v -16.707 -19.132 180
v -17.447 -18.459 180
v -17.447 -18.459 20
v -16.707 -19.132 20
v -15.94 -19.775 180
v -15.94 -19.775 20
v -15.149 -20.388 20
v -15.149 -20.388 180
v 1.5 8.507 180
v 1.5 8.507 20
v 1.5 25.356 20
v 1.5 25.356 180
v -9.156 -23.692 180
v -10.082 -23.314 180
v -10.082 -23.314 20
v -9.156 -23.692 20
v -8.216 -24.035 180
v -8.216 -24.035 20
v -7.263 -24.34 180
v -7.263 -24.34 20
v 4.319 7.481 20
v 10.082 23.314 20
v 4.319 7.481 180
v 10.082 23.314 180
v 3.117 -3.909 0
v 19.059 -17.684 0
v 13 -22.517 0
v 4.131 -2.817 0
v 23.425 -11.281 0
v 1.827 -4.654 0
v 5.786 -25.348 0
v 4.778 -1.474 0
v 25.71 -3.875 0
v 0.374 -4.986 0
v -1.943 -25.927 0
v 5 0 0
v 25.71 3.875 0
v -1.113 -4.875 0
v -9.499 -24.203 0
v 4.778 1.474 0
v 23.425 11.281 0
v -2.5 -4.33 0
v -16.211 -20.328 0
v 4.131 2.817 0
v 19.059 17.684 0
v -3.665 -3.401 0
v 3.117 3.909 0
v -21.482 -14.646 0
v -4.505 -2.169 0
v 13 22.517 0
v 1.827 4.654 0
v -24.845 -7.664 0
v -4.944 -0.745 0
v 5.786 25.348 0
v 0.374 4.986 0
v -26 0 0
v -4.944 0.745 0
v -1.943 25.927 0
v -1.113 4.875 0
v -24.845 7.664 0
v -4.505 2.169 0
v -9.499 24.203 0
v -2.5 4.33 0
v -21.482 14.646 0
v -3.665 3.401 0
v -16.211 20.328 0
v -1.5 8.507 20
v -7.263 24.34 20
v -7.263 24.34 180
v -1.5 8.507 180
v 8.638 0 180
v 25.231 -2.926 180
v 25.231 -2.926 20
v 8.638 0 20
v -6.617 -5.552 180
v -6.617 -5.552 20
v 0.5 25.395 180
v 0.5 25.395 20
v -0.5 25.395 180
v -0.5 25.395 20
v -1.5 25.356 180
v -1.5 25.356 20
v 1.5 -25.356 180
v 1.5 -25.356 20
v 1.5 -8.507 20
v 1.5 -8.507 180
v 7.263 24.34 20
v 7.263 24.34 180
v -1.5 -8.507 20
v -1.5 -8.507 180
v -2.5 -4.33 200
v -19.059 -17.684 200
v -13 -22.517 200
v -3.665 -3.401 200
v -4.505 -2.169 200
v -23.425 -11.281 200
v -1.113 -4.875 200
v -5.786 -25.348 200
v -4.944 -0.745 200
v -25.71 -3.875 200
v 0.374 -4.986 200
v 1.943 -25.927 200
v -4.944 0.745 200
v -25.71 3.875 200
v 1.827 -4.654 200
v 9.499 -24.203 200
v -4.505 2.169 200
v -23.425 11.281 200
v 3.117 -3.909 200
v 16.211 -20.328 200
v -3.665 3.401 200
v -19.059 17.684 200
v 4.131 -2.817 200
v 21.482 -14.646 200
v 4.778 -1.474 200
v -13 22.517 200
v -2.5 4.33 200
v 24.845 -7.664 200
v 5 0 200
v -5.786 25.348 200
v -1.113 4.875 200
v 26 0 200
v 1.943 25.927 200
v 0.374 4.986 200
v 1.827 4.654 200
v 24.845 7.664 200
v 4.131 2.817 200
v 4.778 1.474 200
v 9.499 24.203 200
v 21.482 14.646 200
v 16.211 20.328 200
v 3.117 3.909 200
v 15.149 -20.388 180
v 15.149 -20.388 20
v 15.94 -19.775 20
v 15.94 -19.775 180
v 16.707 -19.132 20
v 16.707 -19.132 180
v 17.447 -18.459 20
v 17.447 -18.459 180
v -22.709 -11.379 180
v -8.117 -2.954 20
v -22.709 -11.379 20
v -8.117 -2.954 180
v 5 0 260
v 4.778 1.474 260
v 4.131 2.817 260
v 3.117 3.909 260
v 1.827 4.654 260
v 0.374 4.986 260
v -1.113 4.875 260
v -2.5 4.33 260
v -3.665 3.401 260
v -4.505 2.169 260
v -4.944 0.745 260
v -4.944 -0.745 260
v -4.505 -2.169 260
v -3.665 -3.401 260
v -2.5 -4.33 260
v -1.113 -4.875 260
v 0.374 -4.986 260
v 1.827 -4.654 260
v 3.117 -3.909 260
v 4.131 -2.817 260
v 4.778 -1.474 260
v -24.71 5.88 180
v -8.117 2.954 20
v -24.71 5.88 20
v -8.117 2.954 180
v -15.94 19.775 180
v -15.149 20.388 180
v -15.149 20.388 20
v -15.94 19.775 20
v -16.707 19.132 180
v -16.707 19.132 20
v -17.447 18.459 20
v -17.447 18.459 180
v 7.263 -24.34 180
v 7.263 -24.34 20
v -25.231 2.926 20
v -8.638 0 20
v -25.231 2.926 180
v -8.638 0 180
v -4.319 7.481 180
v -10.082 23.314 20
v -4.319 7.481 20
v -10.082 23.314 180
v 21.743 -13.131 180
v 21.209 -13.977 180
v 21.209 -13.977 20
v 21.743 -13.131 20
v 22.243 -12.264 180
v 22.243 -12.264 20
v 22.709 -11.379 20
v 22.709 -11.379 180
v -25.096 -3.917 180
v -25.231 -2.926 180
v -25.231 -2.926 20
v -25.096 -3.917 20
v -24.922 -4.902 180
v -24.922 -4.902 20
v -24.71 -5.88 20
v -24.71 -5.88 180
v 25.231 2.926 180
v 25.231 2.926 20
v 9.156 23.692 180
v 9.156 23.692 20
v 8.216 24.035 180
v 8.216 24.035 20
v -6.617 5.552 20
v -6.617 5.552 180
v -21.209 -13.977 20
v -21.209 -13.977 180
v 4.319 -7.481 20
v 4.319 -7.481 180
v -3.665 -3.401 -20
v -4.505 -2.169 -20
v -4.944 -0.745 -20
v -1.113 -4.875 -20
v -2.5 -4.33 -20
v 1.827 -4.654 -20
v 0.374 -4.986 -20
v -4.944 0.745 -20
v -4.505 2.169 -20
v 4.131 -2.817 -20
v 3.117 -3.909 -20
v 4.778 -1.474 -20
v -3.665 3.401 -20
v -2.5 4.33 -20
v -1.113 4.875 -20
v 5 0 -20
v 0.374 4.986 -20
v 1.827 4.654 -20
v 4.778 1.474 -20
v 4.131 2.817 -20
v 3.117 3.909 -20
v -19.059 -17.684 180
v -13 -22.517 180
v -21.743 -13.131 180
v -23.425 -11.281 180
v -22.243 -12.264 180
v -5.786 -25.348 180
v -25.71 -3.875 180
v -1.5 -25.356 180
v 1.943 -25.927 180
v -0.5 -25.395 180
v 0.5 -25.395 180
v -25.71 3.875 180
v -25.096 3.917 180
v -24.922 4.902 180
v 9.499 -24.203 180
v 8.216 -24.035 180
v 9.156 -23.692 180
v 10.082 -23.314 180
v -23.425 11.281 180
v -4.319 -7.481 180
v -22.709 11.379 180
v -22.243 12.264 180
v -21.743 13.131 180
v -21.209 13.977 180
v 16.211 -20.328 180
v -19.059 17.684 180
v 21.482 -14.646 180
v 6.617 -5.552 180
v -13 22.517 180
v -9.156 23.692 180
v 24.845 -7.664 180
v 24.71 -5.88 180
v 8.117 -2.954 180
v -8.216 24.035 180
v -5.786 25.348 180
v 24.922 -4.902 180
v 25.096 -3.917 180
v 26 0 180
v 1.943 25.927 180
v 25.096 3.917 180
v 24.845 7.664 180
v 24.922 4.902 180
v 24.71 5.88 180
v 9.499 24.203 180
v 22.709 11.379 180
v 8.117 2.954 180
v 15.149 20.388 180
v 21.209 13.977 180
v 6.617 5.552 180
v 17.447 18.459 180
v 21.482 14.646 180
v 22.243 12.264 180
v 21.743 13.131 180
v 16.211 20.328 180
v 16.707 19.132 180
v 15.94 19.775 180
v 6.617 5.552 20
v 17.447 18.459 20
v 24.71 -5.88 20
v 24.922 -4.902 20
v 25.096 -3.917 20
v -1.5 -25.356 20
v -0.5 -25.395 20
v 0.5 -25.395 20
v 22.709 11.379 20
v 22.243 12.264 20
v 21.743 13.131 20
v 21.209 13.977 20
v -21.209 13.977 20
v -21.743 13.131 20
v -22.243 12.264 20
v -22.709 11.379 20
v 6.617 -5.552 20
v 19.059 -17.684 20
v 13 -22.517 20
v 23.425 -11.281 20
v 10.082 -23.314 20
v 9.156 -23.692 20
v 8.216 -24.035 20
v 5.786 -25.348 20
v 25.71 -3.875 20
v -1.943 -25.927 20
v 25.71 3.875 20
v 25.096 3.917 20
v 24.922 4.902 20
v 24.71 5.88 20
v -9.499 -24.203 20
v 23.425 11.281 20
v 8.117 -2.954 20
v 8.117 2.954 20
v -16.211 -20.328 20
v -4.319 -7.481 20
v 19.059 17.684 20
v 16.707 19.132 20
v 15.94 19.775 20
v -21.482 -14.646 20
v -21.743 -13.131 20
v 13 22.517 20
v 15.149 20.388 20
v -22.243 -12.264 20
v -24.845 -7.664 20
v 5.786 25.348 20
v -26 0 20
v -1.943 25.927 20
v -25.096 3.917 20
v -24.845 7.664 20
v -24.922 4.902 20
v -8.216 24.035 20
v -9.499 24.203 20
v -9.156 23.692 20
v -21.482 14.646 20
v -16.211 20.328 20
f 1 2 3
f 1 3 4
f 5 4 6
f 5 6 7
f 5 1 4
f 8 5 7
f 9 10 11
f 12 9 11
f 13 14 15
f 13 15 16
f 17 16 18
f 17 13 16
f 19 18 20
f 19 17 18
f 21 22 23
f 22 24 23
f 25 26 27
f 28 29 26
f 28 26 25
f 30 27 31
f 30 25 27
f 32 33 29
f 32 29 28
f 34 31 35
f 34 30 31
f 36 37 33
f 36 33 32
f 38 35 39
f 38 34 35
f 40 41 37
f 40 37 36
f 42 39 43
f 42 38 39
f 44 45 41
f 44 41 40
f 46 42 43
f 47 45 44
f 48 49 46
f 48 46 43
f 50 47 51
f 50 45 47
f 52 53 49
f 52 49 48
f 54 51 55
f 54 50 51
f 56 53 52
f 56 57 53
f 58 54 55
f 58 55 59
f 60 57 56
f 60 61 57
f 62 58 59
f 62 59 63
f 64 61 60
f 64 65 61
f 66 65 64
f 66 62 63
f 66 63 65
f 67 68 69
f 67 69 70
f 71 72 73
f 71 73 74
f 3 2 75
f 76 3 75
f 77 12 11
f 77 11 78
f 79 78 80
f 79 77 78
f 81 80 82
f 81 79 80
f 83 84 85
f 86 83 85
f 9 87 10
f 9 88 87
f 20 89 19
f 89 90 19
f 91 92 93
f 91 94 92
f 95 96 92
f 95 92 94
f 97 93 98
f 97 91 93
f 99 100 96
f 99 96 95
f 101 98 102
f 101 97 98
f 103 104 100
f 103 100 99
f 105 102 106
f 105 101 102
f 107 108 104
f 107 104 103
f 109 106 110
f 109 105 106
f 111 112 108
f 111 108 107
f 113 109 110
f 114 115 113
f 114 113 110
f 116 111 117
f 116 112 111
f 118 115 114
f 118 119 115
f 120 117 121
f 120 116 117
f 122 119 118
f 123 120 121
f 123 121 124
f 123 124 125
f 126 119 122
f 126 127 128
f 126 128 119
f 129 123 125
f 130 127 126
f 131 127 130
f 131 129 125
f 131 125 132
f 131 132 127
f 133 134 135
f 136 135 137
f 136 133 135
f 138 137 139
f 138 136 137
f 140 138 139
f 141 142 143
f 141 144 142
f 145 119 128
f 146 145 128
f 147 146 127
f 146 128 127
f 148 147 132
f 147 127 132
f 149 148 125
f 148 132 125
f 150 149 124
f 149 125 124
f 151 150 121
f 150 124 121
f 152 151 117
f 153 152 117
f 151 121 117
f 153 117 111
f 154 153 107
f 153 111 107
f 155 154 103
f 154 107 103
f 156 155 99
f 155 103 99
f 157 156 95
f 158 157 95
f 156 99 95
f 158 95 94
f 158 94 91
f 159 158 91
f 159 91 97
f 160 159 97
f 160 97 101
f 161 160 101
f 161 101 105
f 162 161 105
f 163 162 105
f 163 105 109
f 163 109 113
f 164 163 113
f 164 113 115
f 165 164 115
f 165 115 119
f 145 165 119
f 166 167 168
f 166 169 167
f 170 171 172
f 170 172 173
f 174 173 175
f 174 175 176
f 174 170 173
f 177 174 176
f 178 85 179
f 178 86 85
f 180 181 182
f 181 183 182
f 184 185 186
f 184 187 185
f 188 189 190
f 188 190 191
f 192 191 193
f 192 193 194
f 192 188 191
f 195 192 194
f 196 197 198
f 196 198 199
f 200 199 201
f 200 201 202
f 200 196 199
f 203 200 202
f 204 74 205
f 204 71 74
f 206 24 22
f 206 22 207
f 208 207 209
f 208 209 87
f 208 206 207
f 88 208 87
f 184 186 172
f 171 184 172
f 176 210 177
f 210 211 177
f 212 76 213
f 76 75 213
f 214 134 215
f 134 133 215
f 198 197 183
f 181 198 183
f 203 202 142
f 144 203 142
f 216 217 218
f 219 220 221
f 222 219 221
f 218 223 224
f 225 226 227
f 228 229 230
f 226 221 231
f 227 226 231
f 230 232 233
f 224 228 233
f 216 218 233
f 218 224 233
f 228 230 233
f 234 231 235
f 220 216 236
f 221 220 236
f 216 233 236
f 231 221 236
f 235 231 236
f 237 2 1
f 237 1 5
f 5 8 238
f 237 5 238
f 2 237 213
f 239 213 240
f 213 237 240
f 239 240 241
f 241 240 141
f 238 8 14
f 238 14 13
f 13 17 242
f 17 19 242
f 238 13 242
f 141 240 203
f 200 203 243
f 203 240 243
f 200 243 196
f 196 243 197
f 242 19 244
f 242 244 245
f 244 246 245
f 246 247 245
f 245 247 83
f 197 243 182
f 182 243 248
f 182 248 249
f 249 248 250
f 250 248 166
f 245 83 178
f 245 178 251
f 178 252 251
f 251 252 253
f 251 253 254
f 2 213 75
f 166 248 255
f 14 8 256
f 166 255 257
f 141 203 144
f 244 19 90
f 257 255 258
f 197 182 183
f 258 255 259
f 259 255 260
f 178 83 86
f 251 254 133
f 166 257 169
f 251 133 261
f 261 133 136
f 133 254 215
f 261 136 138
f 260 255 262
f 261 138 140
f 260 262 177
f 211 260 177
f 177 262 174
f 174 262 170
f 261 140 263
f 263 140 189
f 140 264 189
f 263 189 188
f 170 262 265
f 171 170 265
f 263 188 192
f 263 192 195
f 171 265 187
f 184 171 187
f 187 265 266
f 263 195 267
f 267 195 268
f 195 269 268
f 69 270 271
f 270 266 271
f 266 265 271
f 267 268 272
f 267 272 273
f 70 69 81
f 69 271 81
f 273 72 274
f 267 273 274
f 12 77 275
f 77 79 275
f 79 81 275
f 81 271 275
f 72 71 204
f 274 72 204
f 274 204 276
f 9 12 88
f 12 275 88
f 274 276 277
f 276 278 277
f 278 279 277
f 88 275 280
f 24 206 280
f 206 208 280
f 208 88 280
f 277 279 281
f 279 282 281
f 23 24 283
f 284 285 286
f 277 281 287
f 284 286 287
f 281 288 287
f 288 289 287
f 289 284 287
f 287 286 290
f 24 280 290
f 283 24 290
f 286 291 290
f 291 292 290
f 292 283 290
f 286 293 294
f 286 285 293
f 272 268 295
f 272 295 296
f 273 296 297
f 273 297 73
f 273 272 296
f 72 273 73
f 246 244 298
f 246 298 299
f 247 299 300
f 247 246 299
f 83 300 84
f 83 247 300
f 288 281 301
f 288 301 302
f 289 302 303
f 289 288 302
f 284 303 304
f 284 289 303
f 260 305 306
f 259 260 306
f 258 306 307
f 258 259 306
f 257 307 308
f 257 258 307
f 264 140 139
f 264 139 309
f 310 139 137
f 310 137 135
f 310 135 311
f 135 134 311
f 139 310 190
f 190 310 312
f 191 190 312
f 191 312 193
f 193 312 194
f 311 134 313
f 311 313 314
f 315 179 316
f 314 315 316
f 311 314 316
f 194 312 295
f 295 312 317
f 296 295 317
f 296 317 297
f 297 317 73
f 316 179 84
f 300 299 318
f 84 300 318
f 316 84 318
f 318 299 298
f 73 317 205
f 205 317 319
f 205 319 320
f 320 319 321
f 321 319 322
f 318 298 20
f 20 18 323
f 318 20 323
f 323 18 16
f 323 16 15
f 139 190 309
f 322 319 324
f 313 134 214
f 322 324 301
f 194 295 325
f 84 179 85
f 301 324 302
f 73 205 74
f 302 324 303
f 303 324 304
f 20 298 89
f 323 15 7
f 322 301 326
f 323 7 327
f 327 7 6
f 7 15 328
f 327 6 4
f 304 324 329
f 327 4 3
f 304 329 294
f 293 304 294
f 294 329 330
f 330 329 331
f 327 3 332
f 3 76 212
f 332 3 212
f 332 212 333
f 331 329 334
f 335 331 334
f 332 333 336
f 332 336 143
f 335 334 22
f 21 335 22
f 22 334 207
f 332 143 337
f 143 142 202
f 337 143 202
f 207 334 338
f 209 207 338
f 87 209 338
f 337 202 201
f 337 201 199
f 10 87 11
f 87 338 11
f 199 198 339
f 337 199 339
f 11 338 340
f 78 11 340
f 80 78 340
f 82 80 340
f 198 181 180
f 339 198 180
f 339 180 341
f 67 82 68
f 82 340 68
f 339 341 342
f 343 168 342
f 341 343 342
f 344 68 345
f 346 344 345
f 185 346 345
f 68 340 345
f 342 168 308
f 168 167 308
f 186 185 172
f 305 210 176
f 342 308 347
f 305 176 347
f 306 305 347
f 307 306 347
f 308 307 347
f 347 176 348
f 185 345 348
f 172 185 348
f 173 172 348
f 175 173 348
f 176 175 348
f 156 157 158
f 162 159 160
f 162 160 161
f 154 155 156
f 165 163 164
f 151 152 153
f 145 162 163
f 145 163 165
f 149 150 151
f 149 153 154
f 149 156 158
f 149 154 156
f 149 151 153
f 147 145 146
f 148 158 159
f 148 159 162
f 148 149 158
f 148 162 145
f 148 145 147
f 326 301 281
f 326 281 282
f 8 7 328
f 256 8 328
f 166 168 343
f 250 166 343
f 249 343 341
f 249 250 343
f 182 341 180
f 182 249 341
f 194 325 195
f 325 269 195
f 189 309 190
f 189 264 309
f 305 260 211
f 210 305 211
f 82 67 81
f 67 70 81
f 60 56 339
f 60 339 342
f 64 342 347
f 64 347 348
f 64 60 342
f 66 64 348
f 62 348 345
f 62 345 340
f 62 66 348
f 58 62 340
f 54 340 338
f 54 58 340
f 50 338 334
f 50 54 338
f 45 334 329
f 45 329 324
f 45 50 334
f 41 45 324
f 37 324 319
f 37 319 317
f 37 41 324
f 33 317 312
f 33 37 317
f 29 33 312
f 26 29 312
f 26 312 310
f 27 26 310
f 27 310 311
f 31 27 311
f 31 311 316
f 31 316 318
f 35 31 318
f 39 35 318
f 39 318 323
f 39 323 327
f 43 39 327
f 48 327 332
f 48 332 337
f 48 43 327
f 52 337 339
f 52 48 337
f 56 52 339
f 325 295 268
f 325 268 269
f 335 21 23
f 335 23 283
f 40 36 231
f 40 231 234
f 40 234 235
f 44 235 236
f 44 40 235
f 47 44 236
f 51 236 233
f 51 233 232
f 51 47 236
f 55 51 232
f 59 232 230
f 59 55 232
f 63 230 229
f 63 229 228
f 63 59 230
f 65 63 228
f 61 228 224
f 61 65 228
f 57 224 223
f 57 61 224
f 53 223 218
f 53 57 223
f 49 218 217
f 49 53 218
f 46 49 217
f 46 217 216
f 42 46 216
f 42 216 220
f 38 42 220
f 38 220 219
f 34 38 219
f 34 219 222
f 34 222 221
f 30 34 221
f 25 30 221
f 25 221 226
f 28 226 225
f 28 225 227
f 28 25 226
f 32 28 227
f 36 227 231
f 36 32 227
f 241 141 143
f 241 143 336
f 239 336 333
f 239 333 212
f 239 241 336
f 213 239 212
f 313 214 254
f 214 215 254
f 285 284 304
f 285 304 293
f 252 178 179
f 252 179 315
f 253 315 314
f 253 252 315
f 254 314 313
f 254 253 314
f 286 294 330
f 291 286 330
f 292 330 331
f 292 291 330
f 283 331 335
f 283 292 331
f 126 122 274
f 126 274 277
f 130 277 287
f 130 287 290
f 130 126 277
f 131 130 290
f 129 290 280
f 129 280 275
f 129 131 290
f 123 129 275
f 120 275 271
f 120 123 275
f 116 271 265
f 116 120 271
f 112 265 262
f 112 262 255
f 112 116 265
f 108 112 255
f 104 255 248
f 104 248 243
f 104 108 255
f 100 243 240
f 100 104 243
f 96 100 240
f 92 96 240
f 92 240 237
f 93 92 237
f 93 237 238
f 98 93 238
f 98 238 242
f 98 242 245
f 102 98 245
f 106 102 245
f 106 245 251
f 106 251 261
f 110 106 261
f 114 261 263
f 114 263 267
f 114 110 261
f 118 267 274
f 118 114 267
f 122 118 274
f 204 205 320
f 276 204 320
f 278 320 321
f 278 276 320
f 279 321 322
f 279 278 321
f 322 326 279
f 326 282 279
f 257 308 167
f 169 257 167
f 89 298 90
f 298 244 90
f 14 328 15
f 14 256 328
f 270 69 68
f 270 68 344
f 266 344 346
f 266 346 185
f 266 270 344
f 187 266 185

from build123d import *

# Parameters (mm, degrees)
SKETCH1_R                = 6.35
BOSS_EXTRUDE1_DEPTH      = 300
SKETCH2_W                = 3
SKETCH2_H                = 101.6
BOSS_EXTRUDE2_DEPTH      = 300
CIRPATTERN1_COUNT        = 9
SKETCH9_R                = 60.024928634
SKETCH9_R_2              = 25.4
CUT_EXTRUDE1_DEPTH       = 317.2
SKETCH11_W               = 209.953471272
SKETCH11_H               = 400
CUT_EXTRUDE2_DEPTH       = 158.6
SKETCH13_R               = 5
BOSS_EXTRUDE3_DEPTH      = 260
BOSS_EXTRUDE3_DEPTH_BACK = 20
SKETCH14_R               = 26
BOSS_EXTRUDE4_DEPTH      = 20
SKETCH15_R               = 26
BOSS_EXTRUDE5_DEPTH      = 20


with BuildPart() as part:
    # Sketch1 → Boss-Extrude1 (new body)
    with BuildSketch(Plane.XY):
        Circle(SKETCH1_R)
    extrude(amount=BOSS_EXTRUDE1_DEPTH)

    # Sketch2 → Boss-Extrude2 (add, through all)
    with BuildSketch(Plane.XY.offset(300)):
        Rectangle(SKETCH2_W, SKETCH2_H)
    boss_extrude2 = extrude(amount=-BOSS_EXTRUDE2_DEPTH)

    # CirPattern1: Boss-Extrude2 ×9 about axis
    cirpattern1_axis = Axis((0, 0, 0), (0, 0, 1))
    for i in range(1, CIRPATTERN1_COUNT):
        add(boss_extrude2.rotate(cirpattern1_axis, i * 360 / CIRPATTERN1_COUNT))

    # Sketch9 → Cut-Extrude1 (cut)
    with BuildSketch(Plane.XY.offset(300)):
        Circle(SKETCH9_R)
        Circle(SKETCH9_R_2, mode=Mode.SUBTRACT)
    extrude(amount=-CUT_EXTRUDE1_DEPTH, mode=Mode.SUBTRACT)

    # Sketch11 → Cut-Extrude2 (cut, symmetric)
    with BuildSketch(Plane(origin=(0, 0, 0), x_dir=(1, 0, 0), z_dir=(0, 1, 0))):
        with Locations((-1.595391119, -400)):
            Rectangle(SKETCH11_W, SKETCH11_H)
    extrude(amount=CUT_EXTRUDE2_DEPTH, both=True, mode=Mode.SUBTRACT)

    # Sketch13 → Boss-Extrude3 (add, two sides)
    with BuildSketch(Plane.XY) as boss_extrude3_sk:
        Circle(SKETCH13_R)
    extrude(amount=BOSS_EXTRUDE3_DEPTH)
    extrude(boss_extrude3_sk.sketch, amount=-BOSS_EXTRUDE3_DEPTH_BACK)

    # Sketch14 → Boss-Extrude4 (add)
    with BuildSketch(Plane(origin=(0, 0, 0), x_dir=(-1, 0, 0), z_dir=(0, 0, -1))):
        Circle(SKETCH14_R)
    extrude(amount=-BOSS_EXTRUDE4_DEPTH)

    # Sketch15 → Boss-Extrude5 (add)
    with BuildSketch(Plane.XY.offset(200)):
        Circle(SKETCH15_R)
    extrude(amount=-BOSS_EXTRUDE5_DEPTH)


solid = part.part
